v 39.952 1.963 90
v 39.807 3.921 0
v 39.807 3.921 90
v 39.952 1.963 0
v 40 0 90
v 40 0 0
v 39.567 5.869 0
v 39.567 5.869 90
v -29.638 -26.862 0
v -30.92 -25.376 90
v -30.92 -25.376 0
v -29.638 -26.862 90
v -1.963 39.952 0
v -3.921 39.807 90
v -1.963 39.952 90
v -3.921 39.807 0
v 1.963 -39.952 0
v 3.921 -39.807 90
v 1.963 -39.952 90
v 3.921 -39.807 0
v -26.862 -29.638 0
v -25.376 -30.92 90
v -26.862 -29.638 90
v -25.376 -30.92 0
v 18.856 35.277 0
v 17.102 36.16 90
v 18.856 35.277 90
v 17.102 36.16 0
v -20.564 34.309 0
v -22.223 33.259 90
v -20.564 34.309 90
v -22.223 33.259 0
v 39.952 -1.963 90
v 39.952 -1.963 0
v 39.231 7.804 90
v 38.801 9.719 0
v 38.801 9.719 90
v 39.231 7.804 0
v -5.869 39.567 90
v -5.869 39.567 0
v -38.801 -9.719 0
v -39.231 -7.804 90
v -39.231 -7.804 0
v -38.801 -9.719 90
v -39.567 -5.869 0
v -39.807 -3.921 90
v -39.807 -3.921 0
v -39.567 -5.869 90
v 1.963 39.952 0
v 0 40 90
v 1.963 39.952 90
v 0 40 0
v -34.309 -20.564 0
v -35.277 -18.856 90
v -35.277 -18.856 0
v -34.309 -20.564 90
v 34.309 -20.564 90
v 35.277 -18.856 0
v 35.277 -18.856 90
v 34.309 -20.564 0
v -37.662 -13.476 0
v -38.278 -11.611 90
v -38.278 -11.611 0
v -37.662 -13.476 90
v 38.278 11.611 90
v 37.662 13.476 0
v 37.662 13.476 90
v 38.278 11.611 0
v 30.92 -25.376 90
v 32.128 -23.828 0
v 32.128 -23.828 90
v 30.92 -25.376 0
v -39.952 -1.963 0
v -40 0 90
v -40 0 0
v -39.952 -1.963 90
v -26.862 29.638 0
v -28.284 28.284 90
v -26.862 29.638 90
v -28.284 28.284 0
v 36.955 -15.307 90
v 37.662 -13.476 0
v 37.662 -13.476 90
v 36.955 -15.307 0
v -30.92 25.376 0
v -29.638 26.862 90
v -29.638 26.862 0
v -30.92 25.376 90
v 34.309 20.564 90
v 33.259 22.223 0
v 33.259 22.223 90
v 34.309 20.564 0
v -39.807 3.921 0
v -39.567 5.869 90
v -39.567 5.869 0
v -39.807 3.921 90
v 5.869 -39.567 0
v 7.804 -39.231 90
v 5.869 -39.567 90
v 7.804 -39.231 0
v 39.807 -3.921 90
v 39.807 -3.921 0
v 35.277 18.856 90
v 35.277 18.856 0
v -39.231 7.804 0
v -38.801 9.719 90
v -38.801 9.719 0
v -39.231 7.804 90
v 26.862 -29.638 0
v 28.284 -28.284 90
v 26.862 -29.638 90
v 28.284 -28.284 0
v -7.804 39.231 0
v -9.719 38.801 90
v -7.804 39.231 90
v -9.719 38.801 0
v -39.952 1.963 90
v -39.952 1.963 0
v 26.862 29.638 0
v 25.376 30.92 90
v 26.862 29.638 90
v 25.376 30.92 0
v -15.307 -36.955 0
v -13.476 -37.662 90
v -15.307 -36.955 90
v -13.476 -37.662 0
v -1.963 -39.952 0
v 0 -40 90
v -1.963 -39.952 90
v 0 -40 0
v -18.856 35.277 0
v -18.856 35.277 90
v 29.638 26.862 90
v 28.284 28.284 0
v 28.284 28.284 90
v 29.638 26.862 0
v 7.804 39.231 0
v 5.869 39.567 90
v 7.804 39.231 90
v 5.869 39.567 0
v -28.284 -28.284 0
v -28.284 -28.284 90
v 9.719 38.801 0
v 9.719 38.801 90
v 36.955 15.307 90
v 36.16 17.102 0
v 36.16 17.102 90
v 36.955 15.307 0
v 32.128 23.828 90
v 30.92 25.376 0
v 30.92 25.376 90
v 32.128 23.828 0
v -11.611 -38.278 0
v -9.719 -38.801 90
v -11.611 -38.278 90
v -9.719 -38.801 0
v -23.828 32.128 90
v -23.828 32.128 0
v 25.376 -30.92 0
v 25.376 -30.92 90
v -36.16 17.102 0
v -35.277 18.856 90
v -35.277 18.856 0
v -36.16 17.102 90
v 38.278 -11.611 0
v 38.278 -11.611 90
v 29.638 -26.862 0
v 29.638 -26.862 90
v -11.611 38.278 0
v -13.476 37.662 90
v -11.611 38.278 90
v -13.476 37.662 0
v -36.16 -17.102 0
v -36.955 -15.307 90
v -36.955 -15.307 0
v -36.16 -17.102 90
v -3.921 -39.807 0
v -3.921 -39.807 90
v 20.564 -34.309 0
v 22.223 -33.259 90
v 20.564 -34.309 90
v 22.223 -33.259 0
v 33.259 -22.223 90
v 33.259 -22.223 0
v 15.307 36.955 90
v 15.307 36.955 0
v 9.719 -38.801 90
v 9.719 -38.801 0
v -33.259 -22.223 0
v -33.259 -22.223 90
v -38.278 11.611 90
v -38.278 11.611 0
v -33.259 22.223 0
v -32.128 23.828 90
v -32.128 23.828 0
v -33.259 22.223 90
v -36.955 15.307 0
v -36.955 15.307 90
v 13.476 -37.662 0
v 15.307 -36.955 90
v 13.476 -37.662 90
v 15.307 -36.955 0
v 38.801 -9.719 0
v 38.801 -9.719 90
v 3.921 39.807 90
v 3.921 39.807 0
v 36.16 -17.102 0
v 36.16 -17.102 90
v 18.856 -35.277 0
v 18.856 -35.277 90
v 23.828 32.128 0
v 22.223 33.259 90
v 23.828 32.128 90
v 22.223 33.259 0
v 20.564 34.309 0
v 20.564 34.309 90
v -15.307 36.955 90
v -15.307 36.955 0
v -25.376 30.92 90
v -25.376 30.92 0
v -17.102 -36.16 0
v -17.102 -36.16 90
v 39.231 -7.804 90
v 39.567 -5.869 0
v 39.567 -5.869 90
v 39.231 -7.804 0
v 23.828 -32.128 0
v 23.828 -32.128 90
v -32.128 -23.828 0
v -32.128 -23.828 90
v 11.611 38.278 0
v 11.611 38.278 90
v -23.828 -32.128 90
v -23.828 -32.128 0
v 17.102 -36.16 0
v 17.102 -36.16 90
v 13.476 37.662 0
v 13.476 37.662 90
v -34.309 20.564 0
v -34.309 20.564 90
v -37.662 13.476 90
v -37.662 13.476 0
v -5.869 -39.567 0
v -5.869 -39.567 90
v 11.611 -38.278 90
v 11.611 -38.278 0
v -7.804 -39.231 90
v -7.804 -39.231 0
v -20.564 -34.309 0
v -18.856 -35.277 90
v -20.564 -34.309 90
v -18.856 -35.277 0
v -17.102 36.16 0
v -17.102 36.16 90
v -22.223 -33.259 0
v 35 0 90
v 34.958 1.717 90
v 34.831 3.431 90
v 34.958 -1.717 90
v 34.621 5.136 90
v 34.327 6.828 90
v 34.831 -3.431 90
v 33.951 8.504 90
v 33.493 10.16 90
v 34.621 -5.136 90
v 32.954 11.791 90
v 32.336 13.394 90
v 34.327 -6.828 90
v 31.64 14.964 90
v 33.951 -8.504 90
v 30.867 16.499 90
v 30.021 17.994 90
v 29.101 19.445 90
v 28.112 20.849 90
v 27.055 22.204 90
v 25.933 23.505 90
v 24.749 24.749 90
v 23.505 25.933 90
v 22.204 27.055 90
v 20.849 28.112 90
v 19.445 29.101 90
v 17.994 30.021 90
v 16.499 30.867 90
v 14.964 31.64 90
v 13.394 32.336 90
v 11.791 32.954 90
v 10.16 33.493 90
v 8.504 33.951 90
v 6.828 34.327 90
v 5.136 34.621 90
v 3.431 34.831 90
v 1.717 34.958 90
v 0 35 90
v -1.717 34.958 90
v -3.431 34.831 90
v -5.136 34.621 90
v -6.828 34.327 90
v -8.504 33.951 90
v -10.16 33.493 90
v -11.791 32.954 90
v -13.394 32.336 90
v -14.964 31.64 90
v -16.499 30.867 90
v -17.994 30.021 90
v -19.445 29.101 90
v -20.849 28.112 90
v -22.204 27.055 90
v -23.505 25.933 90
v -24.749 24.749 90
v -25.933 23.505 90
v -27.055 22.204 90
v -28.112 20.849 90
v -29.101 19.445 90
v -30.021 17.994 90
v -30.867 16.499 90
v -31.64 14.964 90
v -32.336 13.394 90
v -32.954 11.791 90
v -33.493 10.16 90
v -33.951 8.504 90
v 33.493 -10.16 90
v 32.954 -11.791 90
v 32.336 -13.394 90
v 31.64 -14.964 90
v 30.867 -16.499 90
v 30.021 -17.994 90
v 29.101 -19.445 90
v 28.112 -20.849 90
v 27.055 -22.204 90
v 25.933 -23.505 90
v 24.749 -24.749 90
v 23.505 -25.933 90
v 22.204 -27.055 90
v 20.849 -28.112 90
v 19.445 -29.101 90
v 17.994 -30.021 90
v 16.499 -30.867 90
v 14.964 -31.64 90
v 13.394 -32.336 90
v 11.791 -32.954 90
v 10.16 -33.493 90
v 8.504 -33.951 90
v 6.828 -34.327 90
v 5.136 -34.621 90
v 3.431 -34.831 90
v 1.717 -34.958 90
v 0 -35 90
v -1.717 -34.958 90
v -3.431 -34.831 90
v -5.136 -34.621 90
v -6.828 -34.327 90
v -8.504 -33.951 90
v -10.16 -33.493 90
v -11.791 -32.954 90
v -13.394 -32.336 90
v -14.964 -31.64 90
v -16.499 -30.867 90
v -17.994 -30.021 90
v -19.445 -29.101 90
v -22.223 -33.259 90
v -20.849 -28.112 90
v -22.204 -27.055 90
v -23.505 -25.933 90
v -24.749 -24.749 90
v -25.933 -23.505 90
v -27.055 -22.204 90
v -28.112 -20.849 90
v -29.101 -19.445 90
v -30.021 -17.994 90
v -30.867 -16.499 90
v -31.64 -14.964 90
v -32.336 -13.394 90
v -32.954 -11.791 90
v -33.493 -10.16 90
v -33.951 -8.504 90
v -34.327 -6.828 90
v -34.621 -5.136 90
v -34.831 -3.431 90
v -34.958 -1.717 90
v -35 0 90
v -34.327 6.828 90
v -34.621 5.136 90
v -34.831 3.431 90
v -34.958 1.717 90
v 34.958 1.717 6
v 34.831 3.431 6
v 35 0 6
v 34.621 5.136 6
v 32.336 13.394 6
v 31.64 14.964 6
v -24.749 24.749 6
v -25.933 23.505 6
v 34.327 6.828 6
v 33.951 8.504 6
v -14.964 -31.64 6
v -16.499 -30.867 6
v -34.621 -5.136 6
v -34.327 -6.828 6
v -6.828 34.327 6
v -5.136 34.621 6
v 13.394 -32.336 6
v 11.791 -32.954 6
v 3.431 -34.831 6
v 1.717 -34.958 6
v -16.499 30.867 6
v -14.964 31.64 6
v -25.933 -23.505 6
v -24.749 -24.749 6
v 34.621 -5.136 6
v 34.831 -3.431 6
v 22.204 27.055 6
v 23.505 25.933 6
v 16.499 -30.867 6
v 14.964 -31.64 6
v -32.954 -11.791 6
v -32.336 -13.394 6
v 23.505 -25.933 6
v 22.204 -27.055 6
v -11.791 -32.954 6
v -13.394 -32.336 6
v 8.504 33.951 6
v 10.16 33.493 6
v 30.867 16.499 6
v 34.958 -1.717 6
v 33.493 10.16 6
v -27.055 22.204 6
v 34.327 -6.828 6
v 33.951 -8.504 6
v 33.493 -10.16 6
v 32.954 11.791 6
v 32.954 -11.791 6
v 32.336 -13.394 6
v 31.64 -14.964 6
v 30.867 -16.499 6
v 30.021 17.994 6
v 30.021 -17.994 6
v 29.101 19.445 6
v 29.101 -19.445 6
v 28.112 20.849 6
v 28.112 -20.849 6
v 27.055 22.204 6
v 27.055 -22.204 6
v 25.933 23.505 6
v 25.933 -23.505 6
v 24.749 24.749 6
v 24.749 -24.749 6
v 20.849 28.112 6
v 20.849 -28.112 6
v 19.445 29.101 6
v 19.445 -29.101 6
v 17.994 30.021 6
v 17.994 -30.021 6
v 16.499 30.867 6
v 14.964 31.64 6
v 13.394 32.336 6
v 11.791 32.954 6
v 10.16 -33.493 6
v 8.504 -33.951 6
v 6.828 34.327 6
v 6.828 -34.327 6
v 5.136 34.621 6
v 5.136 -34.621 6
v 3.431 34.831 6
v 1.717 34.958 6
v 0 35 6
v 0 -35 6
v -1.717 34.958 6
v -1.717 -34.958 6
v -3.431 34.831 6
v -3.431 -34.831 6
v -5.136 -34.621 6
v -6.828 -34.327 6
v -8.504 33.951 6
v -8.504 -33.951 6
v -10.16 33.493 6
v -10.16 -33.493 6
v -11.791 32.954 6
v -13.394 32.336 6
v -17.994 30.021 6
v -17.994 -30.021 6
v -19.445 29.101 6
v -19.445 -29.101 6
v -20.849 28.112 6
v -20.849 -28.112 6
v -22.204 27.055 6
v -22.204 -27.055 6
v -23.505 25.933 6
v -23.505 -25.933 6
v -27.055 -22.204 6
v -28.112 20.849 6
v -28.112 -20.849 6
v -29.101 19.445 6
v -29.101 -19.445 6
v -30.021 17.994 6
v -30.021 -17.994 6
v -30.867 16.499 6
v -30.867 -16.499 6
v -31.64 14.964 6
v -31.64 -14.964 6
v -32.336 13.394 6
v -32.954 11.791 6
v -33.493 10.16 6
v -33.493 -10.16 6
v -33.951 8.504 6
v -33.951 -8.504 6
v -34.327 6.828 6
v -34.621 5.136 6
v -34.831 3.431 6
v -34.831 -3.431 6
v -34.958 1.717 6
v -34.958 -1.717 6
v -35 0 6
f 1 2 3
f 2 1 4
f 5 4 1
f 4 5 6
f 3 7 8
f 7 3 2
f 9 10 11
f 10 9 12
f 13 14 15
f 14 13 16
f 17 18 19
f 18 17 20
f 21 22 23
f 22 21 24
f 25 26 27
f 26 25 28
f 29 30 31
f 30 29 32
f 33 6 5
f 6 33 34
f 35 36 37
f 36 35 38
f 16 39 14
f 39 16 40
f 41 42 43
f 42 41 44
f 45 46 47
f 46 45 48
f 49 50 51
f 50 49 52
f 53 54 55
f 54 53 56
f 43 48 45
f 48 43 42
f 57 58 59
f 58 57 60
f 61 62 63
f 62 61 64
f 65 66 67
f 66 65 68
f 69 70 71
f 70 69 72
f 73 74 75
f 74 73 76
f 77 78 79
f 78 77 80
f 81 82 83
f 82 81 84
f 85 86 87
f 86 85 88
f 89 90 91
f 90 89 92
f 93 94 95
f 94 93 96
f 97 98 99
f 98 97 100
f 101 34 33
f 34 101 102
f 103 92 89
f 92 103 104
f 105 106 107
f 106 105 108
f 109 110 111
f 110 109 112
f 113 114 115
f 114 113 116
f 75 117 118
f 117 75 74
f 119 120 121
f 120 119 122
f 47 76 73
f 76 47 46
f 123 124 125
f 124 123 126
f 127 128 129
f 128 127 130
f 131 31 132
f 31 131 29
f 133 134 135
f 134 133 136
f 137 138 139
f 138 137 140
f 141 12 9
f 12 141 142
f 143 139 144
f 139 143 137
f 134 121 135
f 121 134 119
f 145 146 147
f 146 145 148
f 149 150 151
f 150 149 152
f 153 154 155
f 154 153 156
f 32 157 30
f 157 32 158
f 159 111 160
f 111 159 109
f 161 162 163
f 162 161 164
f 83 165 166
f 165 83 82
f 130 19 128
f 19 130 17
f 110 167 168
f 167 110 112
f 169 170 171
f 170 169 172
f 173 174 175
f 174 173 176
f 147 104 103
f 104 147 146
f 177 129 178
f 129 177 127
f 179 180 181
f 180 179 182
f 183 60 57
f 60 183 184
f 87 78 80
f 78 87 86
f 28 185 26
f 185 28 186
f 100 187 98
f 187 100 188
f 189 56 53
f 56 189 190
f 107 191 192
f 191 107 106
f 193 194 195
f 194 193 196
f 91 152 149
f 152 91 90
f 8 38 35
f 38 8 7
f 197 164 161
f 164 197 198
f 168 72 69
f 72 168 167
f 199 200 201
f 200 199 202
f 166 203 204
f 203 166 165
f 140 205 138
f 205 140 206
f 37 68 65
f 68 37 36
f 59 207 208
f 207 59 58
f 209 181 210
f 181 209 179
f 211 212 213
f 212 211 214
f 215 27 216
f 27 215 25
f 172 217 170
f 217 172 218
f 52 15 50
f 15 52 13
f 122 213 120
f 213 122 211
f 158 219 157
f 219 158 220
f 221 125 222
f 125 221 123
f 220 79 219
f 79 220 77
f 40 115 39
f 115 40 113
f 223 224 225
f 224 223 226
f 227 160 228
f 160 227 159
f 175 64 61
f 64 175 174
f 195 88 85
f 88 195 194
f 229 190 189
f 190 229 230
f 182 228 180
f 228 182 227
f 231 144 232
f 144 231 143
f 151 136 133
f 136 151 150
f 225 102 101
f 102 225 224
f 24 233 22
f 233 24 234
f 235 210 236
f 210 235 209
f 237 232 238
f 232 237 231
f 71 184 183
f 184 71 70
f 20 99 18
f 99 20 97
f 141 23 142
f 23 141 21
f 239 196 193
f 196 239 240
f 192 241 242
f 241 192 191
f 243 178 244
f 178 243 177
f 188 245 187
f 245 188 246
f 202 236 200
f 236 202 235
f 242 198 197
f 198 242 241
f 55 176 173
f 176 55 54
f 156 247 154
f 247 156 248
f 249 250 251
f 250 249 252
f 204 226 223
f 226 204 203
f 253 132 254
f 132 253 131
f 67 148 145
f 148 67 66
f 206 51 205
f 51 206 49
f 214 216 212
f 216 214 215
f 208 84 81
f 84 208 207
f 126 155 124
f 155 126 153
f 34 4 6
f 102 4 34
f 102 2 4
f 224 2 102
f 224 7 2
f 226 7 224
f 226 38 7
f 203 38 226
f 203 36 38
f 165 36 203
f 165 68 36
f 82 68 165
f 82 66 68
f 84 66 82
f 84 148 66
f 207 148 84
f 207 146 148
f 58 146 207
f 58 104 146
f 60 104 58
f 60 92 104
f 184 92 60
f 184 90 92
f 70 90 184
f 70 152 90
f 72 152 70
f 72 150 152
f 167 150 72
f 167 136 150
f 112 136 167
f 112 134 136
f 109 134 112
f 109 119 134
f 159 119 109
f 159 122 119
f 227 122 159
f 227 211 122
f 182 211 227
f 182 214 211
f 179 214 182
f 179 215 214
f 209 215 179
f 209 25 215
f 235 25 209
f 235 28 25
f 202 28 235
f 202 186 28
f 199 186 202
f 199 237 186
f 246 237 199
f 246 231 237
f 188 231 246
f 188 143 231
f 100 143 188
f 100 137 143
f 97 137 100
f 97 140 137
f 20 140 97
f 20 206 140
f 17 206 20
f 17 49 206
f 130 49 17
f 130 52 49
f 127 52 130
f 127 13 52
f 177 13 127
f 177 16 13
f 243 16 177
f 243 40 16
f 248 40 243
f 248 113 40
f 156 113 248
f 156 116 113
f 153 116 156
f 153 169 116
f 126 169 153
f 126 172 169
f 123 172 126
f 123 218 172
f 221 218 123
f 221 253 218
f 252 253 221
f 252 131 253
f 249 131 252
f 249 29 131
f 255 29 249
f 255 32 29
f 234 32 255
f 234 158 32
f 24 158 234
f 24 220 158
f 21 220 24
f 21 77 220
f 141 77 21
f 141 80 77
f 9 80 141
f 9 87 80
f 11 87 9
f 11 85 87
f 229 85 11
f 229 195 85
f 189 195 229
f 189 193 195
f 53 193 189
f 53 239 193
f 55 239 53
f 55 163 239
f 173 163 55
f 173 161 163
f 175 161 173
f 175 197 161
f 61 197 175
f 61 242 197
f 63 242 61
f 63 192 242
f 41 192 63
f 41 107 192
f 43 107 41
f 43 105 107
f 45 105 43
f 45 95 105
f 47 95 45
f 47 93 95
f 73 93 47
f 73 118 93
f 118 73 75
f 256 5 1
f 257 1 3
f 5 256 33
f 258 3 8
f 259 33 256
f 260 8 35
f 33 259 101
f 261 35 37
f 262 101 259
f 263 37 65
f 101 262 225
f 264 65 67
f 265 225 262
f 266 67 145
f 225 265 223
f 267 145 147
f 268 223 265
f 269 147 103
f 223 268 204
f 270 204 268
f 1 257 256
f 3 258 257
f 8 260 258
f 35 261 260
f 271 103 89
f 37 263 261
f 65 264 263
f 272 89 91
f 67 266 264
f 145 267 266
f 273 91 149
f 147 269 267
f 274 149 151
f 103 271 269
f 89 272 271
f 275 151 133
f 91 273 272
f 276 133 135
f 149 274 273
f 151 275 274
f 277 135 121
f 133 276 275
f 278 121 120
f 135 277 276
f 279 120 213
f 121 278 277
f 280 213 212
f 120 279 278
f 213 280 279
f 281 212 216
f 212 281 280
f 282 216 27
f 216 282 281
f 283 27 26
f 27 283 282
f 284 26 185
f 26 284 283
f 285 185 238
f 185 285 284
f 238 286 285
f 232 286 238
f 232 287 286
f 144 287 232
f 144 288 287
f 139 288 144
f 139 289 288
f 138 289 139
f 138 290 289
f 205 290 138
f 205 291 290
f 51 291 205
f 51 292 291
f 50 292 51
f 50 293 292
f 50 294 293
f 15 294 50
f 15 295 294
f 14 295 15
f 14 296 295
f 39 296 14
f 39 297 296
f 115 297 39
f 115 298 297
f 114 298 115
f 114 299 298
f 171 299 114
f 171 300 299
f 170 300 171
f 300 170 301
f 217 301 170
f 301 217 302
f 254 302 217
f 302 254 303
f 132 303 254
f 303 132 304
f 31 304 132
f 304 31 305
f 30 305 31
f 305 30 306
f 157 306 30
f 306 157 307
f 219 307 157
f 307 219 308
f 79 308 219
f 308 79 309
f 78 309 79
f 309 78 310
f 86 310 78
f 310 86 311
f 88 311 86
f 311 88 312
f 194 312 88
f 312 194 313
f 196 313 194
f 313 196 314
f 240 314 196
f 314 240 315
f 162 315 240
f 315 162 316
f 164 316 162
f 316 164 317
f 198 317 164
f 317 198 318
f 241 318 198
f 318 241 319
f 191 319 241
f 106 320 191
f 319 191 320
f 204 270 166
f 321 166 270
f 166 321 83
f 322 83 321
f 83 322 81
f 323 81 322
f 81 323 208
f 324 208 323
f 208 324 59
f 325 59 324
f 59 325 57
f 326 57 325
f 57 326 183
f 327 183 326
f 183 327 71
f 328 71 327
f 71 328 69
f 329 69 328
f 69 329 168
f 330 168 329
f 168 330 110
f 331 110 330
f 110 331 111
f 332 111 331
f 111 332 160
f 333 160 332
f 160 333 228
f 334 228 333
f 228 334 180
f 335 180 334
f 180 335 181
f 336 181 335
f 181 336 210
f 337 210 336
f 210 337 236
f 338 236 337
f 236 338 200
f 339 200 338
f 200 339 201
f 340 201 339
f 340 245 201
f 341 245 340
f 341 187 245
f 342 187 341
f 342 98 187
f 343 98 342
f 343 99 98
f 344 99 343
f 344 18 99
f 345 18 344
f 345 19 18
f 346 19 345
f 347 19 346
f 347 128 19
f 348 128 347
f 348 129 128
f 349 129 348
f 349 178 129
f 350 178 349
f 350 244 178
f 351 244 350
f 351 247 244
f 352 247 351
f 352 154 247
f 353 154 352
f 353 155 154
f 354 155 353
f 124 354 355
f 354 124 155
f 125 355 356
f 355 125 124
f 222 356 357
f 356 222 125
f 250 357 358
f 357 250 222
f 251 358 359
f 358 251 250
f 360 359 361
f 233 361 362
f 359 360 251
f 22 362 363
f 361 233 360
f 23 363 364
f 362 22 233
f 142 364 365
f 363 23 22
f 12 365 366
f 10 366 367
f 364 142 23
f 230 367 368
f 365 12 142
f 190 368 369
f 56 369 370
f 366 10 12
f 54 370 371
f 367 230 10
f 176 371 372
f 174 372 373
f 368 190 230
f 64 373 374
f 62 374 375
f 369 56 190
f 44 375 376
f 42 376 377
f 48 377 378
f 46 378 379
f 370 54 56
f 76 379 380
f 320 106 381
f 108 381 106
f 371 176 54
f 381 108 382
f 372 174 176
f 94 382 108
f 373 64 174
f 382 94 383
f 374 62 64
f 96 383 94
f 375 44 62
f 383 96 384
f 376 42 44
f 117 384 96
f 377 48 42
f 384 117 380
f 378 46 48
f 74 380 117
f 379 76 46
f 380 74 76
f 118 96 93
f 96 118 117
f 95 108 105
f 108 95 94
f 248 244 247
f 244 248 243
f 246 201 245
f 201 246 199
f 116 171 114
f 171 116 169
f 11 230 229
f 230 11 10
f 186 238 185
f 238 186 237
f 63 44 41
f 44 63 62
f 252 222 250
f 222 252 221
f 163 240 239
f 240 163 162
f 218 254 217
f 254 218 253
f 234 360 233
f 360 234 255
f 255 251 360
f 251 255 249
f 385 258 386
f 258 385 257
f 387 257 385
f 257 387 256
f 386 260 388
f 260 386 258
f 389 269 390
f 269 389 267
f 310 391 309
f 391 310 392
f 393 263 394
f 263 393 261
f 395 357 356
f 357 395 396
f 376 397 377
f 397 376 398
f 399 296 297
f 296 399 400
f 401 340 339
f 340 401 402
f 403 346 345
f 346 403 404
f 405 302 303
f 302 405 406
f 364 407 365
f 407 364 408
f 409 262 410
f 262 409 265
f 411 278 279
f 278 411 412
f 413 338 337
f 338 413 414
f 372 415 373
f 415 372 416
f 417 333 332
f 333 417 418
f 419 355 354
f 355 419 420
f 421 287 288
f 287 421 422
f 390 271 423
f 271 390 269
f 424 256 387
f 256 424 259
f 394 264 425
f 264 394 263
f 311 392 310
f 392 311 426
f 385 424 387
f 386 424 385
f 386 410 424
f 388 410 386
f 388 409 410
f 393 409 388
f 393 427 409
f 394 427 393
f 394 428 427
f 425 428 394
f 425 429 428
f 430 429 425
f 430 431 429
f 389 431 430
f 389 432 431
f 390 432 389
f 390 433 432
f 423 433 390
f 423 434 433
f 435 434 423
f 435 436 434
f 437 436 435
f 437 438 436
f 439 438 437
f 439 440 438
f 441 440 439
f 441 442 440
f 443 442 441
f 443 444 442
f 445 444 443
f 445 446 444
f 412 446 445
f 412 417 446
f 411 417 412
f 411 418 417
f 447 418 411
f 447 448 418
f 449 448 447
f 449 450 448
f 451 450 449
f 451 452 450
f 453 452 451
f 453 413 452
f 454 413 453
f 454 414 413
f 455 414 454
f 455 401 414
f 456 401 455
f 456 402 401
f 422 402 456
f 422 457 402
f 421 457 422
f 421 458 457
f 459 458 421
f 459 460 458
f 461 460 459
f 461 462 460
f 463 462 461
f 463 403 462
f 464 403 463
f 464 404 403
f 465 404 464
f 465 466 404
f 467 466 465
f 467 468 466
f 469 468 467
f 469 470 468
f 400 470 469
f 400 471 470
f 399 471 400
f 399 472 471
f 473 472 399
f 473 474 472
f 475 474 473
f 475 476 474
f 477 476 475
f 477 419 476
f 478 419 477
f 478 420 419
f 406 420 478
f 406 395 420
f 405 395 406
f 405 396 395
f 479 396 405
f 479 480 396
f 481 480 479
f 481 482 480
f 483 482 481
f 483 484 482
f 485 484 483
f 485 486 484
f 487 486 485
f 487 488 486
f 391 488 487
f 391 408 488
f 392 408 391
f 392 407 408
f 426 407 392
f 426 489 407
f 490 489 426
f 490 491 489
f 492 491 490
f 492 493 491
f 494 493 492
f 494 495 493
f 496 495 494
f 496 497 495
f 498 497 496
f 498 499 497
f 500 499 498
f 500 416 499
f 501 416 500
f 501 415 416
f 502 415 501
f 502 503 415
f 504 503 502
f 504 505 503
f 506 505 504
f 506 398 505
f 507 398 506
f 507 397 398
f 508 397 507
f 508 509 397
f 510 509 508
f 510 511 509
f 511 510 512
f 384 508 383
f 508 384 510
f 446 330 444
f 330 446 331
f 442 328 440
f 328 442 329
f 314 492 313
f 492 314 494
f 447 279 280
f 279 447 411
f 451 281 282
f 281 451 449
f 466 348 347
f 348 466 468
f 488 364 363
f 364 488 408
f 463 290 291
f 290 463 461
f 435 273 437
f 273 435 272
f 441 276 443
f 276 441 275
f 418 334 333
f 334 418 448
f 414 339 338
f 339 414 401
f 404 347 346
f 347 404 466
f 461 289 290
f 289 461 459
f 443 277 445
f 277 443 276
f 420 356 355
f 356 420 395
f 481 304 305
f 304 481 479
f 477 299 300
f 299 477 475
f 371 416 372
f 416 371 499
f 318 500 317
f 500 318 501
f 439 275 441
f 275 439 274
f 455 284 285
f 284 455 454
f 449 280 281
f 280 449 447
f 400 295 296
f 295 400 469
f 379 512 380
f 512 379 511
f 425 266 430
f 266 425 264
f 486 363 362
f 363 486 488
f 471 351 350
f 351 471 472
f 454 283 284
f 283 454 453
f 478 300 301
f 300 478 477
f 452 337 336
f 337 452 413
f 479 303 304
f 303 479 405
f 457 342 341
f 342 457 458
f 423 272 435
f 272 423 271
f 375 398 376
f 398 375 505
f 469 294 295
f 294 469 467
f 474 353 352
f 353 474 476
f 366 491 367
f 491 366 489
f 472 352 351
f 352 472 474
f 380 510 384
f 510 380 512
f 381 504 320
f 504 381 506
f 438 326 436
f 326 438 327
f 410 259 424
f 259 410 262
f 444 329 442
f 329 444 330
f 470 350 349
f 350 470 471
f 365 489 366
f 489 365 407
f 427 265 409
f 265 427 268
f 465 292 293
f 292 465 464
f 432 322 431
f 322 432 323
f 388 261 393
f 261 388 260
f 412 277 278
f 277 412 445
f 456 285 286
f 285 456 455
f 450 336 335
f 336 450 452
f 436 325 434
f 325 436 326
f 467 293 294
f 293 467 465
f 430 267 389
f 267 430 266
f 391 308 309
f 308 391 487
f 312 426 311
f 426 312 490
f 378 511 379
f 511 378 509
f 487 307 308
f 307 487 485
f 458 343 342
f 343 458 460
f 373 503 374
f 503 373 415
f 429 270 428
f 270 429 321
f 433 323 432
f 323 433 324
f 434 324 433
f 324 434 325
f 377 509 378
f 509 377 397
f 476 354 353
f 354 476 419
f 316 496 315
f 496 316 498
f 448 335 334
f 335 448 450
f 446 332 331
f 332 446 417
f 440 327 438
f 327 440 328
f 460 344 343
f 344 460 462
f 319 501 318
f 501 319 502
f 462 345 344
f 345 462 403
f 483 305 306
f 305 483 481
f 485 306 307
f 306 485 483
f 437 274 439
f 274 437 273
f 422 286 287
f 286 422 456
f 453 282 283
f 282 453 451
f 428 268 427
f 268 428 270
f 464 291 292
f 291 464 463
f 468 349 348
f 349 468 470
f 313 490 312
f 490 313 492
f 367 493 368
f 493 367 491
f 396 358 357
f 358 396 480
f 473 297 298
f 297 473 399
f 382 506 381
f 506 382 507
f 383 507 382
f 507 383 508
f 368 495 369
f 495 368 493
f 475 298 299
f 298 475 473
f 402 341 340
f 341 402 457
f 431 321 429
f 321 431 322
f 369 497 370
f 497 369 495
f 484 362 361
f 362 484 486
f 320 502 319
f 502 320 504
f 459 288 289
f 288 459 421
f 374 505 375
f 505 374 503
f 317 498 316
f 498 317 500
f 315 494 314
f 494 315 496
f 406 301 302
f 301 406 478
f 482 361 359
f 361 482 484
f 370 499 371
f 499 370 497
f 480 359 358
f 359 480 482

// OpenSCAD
// Oriented mug with D-shaped handle
$fn = 128;

// ---------- Mug parameters ----------
mug_outer_d      = 80;          // mm
mug_inner_d      = 70;          // mm
mug_height       = 90;          // mm
bottom_thickness = 6;           // mm
wall_thickness   = (mug_outer_d - mug_inner_d) / 2;   // 5 mm

// ---------- Handle parameters ----------
handle_open_h = 30;             // inner void height (Z)
handle_open_w = 25;             // inner void radial width (X)
handle_wall   = wall_thickness; // thickness around void (5 mm)
handle_depth  = 15;             // thickness in Y

// Derived
handle_outer_h = handle_open_h + 2*handle_wall;       // 40
handle_inner_r = handle_open_h / 2;                   // 15
handle_outer_r = handle_outer_h / 2;                  // 20

// ---------- Modules ----------
module mug_body(){
    difference(){
        cylinder(h = mug_height, r = mug_outer_d/2);
        translate([0,0,bottom_thickness])
            cylinder(h = mug_height - bottom_thickness, r = mug_inner_d/2);
    }
}

// Outer 2-D D-shape (full handle cross-section)
module handle_outer_2d(){
    union(){
        // straight side against mug
        translate([0, -handle_outer_h/2])
            square([handle_outer_r, handle_outer_h]);
        // curved outer side
        translate([handle_outer_r, 0])
            circle(r = handle_outer_r);
    }
}

// Inner 2-D void to create finger space
module handle_inner_2d(){
    union(){
        // rectangular part of void
        translate([handle_wall, -handle_open_h/2])
            square([handle_open_w - handle_inner_r, handle_open_h]);
        // semicircular part of void
        translate([handle_wall + handle_open_w - handle_inner_r, 0])
            circle(r = handle_inner_r);
    }
}

module handle(){
    // Build 3-D handle by extruding the 2-D profile,
    // then rotate so Z is vertical and Y is handle depth
    rotate([90,0,0])
        linear_extrude(height = handle_depth, center = true)
            difference(){
                handle_outer_2d();
                handle_inner_2d();
            }
}

// ---------- Assembly ----------
union(){
    // Mug body
    mug_body();

    // Handle on +X side, centered vertically
    translate([mug_outer_d/2 - 0.01, 0, (mug_height - handle_outer_h)/2])
        handle();
}
